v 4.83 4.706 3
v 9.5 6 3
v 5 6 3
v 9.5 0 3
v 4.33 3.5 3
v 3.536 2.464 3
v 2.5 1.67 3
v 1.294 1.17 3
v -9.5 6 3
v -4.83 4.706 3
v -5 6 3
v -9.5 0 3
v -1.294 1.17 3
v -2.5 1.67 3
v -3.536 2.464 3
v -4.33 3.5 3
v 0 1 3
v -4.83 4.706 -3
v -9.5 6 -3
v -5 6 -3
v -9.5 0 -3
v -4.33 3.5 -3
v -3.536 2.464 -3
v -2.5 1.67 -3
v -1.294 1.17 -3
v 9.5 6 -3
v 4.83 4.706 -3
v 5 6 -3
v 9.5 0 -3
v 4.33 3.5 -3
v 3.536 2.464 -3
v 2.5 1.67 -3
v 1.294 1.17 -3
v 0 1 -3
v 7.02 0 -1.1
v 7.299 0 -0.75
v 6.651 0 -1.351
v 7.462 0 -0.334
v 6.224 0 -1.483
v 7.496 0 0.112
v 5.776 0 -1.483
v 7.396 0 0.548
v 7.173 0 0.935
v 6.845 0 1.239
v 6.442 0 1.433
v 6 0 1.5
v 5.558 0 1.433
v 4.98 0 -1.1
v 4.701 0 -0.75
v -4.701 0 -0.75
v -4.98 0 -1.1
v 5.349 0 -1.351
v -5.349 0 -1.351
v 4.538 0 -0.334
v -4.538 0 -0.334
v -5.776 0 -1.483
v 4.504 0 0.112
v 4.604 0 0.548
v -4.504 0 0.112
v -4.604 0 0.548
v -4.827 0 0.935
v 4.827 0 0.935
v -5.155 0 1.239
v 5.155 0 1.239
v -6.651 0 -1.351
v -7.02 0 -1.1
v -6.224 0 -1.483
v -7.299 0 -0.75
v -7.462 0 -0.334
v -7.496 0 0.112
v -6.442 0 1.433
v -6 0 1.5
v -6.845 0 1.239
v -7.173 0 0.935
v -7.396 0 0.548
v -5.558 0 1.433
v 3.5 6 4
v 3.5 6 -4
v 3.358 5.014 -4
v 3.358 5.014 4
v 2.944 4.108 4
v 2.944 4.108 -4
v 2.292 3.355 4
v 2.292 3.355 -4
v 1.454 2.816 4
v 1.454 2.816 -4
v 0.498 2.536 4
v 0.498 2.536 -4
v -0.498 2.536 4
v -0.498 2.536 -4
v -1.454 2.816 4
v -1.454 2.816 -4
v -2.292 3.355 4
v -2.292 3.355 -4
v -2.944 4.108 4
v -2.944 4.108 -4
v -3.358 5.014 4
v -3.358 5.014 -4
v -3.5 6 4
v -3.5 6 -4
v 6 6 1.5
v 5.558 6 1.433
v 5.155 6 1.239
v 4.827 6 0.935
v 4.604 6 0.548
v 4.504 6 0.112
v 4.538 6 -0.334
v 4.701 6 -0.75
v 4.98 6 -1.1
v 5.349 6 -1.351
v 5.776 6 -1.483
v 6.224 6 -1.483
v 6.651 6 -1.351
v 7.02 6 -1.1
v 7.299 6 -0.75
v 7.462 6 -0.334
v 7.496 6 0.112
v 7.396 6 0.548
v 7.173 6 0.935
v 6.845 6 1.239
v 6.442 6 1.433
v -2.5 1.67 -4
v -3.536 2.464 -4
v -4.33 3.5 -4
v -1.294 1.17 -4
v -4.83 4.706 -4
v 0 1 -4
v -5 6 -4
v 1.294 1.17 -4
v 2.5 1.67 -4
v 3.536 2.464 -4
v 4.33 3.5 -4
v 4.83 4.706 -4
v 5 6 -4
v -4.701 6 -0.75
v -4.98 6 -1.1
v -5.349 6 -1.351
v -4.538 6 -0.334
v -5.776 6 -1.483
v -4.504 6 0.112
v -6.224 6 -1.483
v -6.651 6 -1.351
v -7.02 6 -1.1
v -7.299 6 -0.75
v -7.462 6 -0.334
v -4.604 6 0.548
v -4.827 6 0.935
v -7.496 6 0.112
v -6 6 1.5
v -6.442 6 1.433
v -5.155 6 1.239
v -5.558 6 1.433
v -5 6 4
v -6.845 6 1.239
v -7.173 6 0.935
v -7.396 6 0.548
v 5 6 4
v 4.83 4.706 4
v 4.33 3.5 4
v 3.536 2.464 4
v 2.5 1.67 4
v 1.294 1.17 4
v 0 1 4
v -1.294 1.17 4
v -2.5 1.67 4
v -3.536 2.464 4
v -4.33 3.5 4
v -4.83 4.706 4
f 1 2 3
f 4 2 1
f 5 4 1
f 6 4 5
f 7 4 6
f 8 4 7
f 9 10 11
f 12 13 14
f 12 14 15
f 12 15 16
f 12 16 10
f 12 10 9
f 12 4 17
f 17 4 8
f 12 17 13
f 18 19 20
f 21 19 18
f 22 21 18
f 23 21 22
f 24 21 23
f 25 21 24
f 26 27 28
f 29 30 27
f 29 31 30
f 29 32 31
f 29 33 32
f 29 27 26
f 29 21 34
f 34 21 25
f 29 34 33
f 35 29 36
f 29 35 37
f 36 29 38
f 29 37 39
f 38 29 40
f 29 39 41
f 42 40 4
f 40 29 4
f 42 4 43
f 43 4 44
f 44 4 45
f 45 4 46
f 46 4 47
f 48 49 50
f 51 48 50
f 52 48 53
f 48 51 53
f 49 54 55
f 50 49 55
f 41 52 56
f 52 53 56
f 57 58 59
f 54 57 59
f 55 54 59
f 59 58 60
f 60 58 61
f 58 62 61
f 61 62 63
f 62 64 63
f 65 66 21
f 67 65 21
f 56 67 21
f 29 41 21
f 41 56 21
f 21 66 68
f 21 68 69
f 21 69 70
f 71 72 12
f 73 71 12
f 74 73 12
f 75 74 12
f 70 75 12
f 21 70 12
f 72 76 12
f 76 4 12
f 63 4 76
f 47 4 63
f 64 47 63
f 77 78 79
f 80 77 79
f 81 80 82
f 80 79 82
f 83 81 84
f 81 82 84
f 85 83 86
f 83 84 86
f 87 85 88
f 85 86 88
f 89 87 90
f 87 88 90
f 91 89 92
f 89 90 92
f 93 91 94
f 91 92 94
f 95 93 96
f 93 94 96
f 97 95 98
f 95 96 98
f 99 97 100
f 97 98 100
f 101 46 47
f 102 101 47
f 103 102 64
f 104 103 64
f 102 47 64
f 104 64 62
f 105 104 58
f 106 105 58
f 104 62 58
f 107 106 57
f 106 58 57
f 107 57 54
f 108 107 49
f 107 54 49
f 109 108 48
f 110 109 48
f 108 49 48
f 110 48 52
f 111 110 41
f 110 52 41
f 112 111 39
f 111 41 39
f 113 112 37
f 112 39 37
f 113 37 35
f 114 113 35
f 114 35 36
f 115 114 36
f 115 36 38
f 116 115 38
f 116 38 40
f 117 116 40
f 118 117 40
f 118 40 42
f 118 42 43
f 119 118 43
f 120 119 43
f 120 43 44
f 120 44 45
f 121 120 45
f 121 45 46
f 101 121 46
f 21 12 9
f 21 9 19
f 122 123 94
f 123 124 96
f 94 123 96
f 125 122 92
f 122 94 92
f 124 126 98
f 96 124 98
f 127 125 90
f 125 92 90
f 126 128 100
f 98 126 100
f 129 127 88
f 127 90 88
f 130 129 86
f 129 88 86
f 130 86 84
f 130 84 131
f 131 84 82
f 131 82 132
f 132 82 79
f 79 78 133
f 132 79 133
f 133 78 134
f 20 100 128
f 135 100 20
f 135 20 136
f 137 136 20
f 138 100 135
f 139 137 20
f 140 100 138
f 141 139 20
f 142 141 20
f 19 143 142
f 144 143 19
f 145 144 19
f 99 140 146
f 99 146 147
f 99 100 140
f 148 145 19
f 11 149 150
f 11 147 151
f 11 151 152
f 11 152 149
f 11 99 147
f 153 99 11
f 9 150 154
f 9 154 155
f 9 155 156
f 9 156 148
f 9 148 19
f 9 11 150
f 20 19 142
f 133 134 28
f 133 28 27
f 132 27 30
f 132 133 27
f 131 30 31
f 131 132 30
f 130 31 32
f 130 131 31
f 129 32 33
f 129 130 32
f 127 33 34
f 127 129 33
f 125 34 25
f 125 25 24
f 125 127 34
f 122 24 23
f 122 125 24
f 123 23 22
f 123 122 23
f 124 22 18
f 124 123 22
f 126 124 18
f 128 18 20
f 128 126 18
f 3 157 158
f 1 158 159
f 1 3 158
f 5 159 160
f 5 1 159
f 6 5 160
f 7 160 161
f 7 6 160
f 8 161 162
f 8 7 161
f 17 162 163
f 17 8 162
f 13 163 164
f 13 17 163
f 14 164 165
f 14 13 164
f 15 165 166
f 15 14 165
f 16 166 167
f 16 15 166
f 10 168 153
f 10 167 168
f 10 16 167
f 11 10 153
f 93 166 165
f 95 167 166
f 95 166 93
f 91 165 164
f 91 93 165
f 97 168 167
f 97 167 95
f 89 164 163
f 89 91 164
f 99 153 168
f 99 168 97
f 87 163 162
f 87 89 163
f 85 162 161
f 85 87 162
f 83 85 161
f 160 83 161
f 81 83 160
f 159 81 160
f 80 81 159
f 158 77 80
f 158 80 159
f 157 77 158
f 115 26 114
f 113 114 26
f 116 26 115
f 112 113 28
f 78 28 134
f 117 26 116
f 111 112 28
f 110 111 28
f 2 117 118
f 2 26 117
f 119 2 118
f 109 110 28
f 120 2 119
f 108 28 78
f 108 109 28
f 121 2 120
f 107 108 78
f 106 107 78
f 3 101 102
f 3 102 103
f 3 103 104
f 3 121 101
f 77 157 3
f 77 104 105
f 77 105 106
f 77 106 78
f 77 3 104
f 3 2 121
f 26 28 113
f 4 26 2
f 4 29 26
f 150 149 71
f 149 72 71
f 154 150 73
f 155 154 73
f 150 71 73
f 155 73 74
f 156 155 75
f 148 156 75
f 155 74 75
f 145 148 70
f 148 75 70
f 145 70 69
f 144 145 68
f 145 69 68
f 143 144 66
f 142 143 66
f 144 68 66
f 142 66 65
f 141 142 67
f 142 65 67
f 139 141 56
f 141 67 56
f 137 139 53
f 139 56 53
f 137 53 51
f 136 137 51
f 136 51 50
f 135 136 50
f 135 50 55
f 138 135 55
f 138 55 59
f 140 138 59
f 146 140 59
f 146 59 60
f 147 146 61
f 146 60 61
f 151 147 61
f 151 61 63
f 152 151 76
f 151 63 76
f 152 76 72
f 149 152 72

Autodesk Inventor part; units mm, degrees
ref_plane "YZ Plane" through (0, 0, 0) normal (1, 0, 0) x (0, 1, 0)
ref_plane "XZ Plane" through (0, 0, 0) normal (0, 1, 0) x (-1, 0, 0)
ref_plane "XY Plane" through (0, 0, 0) normal (0, 0, 1) x (1, 0, 0)
sketch "Sketch1" plane through (0, 0, 0) normal (0, 1, 0) x (-1, 0, 0)
  line L0 (9.5, -3) -> (-9.5, -3)
  line L1 (-9.5, -3) -> (-9.5, 3)
  line L2 (-9.5, 3) -> (9.5, 3)
  line L3 (9.5, 3) -> (9.5, -3)
  line L4 (9.5, -3) -> (-9.5, 3) construction
  line L5 (-9.5, -3) -> (9.5, 3) construction
  point P0 (0, 0)
  dimension "d0" = 19
  dimension "d1" = 6
extrude "Extrusion1" add sketch "Sketch1" along normal blind 6
sketch "Sketch2" plane through (-9.5, 0, 3) normal (0, 0, 1) x (1, 0, 0)
  line L0 (19, 6) -> (0, 6) projected
  arc A0 (4.5, 6) -> (14.5, 6) centre (9.5, 6) ccw
  point P0 (9.5, 0)
  point P1 (14.5, 6)
  dimension "d4" = 5
extrude "Extrusion2" add sketch "Sketch2" along normal blind 1 and the other way blind 7
sketch "Sketch3" plane through (-9.5, 0, 4) normal (0, 0, 1) x (1, 0, 0)
  line L0 (14.5, 6) -> (4.5, 6) projected
  point P0 (9.5, 0)
  point P1 (9.5, 6)
hole "Hole1" at (0, 6, 4) direction (0, 0, -1) diameter 7 end through all
sketch "Sketch4" plane through (0, 6, 0) normal (0, 1, 0) x (1, 0, 0)
  line L0 (-5, 3) -> (-9.5, 3) projected
  line L1 (9.5, 3) -> (5, 3) projected
  line L2 (-9.5, 3) -> (-9.5, -3) projected
  line L3 (9.5, -3) -> (9.5, 3) projected
  point P0 (0, 0)
  point P1 (-6, 0)
  point P2 (6, 0)
  dimension "d16" = 3
  dimension "d17" = 3
  dimension "d18" = 12
  dimension "d19" = 3.5
  dimension "d20" = 3.5
hole "Hole2" at (-6, 6, 0) at (6, 6, 0) direction (0, -1, 0) diameter 3 end through all
properties material "Brass, Soft Yellow, Welded"
